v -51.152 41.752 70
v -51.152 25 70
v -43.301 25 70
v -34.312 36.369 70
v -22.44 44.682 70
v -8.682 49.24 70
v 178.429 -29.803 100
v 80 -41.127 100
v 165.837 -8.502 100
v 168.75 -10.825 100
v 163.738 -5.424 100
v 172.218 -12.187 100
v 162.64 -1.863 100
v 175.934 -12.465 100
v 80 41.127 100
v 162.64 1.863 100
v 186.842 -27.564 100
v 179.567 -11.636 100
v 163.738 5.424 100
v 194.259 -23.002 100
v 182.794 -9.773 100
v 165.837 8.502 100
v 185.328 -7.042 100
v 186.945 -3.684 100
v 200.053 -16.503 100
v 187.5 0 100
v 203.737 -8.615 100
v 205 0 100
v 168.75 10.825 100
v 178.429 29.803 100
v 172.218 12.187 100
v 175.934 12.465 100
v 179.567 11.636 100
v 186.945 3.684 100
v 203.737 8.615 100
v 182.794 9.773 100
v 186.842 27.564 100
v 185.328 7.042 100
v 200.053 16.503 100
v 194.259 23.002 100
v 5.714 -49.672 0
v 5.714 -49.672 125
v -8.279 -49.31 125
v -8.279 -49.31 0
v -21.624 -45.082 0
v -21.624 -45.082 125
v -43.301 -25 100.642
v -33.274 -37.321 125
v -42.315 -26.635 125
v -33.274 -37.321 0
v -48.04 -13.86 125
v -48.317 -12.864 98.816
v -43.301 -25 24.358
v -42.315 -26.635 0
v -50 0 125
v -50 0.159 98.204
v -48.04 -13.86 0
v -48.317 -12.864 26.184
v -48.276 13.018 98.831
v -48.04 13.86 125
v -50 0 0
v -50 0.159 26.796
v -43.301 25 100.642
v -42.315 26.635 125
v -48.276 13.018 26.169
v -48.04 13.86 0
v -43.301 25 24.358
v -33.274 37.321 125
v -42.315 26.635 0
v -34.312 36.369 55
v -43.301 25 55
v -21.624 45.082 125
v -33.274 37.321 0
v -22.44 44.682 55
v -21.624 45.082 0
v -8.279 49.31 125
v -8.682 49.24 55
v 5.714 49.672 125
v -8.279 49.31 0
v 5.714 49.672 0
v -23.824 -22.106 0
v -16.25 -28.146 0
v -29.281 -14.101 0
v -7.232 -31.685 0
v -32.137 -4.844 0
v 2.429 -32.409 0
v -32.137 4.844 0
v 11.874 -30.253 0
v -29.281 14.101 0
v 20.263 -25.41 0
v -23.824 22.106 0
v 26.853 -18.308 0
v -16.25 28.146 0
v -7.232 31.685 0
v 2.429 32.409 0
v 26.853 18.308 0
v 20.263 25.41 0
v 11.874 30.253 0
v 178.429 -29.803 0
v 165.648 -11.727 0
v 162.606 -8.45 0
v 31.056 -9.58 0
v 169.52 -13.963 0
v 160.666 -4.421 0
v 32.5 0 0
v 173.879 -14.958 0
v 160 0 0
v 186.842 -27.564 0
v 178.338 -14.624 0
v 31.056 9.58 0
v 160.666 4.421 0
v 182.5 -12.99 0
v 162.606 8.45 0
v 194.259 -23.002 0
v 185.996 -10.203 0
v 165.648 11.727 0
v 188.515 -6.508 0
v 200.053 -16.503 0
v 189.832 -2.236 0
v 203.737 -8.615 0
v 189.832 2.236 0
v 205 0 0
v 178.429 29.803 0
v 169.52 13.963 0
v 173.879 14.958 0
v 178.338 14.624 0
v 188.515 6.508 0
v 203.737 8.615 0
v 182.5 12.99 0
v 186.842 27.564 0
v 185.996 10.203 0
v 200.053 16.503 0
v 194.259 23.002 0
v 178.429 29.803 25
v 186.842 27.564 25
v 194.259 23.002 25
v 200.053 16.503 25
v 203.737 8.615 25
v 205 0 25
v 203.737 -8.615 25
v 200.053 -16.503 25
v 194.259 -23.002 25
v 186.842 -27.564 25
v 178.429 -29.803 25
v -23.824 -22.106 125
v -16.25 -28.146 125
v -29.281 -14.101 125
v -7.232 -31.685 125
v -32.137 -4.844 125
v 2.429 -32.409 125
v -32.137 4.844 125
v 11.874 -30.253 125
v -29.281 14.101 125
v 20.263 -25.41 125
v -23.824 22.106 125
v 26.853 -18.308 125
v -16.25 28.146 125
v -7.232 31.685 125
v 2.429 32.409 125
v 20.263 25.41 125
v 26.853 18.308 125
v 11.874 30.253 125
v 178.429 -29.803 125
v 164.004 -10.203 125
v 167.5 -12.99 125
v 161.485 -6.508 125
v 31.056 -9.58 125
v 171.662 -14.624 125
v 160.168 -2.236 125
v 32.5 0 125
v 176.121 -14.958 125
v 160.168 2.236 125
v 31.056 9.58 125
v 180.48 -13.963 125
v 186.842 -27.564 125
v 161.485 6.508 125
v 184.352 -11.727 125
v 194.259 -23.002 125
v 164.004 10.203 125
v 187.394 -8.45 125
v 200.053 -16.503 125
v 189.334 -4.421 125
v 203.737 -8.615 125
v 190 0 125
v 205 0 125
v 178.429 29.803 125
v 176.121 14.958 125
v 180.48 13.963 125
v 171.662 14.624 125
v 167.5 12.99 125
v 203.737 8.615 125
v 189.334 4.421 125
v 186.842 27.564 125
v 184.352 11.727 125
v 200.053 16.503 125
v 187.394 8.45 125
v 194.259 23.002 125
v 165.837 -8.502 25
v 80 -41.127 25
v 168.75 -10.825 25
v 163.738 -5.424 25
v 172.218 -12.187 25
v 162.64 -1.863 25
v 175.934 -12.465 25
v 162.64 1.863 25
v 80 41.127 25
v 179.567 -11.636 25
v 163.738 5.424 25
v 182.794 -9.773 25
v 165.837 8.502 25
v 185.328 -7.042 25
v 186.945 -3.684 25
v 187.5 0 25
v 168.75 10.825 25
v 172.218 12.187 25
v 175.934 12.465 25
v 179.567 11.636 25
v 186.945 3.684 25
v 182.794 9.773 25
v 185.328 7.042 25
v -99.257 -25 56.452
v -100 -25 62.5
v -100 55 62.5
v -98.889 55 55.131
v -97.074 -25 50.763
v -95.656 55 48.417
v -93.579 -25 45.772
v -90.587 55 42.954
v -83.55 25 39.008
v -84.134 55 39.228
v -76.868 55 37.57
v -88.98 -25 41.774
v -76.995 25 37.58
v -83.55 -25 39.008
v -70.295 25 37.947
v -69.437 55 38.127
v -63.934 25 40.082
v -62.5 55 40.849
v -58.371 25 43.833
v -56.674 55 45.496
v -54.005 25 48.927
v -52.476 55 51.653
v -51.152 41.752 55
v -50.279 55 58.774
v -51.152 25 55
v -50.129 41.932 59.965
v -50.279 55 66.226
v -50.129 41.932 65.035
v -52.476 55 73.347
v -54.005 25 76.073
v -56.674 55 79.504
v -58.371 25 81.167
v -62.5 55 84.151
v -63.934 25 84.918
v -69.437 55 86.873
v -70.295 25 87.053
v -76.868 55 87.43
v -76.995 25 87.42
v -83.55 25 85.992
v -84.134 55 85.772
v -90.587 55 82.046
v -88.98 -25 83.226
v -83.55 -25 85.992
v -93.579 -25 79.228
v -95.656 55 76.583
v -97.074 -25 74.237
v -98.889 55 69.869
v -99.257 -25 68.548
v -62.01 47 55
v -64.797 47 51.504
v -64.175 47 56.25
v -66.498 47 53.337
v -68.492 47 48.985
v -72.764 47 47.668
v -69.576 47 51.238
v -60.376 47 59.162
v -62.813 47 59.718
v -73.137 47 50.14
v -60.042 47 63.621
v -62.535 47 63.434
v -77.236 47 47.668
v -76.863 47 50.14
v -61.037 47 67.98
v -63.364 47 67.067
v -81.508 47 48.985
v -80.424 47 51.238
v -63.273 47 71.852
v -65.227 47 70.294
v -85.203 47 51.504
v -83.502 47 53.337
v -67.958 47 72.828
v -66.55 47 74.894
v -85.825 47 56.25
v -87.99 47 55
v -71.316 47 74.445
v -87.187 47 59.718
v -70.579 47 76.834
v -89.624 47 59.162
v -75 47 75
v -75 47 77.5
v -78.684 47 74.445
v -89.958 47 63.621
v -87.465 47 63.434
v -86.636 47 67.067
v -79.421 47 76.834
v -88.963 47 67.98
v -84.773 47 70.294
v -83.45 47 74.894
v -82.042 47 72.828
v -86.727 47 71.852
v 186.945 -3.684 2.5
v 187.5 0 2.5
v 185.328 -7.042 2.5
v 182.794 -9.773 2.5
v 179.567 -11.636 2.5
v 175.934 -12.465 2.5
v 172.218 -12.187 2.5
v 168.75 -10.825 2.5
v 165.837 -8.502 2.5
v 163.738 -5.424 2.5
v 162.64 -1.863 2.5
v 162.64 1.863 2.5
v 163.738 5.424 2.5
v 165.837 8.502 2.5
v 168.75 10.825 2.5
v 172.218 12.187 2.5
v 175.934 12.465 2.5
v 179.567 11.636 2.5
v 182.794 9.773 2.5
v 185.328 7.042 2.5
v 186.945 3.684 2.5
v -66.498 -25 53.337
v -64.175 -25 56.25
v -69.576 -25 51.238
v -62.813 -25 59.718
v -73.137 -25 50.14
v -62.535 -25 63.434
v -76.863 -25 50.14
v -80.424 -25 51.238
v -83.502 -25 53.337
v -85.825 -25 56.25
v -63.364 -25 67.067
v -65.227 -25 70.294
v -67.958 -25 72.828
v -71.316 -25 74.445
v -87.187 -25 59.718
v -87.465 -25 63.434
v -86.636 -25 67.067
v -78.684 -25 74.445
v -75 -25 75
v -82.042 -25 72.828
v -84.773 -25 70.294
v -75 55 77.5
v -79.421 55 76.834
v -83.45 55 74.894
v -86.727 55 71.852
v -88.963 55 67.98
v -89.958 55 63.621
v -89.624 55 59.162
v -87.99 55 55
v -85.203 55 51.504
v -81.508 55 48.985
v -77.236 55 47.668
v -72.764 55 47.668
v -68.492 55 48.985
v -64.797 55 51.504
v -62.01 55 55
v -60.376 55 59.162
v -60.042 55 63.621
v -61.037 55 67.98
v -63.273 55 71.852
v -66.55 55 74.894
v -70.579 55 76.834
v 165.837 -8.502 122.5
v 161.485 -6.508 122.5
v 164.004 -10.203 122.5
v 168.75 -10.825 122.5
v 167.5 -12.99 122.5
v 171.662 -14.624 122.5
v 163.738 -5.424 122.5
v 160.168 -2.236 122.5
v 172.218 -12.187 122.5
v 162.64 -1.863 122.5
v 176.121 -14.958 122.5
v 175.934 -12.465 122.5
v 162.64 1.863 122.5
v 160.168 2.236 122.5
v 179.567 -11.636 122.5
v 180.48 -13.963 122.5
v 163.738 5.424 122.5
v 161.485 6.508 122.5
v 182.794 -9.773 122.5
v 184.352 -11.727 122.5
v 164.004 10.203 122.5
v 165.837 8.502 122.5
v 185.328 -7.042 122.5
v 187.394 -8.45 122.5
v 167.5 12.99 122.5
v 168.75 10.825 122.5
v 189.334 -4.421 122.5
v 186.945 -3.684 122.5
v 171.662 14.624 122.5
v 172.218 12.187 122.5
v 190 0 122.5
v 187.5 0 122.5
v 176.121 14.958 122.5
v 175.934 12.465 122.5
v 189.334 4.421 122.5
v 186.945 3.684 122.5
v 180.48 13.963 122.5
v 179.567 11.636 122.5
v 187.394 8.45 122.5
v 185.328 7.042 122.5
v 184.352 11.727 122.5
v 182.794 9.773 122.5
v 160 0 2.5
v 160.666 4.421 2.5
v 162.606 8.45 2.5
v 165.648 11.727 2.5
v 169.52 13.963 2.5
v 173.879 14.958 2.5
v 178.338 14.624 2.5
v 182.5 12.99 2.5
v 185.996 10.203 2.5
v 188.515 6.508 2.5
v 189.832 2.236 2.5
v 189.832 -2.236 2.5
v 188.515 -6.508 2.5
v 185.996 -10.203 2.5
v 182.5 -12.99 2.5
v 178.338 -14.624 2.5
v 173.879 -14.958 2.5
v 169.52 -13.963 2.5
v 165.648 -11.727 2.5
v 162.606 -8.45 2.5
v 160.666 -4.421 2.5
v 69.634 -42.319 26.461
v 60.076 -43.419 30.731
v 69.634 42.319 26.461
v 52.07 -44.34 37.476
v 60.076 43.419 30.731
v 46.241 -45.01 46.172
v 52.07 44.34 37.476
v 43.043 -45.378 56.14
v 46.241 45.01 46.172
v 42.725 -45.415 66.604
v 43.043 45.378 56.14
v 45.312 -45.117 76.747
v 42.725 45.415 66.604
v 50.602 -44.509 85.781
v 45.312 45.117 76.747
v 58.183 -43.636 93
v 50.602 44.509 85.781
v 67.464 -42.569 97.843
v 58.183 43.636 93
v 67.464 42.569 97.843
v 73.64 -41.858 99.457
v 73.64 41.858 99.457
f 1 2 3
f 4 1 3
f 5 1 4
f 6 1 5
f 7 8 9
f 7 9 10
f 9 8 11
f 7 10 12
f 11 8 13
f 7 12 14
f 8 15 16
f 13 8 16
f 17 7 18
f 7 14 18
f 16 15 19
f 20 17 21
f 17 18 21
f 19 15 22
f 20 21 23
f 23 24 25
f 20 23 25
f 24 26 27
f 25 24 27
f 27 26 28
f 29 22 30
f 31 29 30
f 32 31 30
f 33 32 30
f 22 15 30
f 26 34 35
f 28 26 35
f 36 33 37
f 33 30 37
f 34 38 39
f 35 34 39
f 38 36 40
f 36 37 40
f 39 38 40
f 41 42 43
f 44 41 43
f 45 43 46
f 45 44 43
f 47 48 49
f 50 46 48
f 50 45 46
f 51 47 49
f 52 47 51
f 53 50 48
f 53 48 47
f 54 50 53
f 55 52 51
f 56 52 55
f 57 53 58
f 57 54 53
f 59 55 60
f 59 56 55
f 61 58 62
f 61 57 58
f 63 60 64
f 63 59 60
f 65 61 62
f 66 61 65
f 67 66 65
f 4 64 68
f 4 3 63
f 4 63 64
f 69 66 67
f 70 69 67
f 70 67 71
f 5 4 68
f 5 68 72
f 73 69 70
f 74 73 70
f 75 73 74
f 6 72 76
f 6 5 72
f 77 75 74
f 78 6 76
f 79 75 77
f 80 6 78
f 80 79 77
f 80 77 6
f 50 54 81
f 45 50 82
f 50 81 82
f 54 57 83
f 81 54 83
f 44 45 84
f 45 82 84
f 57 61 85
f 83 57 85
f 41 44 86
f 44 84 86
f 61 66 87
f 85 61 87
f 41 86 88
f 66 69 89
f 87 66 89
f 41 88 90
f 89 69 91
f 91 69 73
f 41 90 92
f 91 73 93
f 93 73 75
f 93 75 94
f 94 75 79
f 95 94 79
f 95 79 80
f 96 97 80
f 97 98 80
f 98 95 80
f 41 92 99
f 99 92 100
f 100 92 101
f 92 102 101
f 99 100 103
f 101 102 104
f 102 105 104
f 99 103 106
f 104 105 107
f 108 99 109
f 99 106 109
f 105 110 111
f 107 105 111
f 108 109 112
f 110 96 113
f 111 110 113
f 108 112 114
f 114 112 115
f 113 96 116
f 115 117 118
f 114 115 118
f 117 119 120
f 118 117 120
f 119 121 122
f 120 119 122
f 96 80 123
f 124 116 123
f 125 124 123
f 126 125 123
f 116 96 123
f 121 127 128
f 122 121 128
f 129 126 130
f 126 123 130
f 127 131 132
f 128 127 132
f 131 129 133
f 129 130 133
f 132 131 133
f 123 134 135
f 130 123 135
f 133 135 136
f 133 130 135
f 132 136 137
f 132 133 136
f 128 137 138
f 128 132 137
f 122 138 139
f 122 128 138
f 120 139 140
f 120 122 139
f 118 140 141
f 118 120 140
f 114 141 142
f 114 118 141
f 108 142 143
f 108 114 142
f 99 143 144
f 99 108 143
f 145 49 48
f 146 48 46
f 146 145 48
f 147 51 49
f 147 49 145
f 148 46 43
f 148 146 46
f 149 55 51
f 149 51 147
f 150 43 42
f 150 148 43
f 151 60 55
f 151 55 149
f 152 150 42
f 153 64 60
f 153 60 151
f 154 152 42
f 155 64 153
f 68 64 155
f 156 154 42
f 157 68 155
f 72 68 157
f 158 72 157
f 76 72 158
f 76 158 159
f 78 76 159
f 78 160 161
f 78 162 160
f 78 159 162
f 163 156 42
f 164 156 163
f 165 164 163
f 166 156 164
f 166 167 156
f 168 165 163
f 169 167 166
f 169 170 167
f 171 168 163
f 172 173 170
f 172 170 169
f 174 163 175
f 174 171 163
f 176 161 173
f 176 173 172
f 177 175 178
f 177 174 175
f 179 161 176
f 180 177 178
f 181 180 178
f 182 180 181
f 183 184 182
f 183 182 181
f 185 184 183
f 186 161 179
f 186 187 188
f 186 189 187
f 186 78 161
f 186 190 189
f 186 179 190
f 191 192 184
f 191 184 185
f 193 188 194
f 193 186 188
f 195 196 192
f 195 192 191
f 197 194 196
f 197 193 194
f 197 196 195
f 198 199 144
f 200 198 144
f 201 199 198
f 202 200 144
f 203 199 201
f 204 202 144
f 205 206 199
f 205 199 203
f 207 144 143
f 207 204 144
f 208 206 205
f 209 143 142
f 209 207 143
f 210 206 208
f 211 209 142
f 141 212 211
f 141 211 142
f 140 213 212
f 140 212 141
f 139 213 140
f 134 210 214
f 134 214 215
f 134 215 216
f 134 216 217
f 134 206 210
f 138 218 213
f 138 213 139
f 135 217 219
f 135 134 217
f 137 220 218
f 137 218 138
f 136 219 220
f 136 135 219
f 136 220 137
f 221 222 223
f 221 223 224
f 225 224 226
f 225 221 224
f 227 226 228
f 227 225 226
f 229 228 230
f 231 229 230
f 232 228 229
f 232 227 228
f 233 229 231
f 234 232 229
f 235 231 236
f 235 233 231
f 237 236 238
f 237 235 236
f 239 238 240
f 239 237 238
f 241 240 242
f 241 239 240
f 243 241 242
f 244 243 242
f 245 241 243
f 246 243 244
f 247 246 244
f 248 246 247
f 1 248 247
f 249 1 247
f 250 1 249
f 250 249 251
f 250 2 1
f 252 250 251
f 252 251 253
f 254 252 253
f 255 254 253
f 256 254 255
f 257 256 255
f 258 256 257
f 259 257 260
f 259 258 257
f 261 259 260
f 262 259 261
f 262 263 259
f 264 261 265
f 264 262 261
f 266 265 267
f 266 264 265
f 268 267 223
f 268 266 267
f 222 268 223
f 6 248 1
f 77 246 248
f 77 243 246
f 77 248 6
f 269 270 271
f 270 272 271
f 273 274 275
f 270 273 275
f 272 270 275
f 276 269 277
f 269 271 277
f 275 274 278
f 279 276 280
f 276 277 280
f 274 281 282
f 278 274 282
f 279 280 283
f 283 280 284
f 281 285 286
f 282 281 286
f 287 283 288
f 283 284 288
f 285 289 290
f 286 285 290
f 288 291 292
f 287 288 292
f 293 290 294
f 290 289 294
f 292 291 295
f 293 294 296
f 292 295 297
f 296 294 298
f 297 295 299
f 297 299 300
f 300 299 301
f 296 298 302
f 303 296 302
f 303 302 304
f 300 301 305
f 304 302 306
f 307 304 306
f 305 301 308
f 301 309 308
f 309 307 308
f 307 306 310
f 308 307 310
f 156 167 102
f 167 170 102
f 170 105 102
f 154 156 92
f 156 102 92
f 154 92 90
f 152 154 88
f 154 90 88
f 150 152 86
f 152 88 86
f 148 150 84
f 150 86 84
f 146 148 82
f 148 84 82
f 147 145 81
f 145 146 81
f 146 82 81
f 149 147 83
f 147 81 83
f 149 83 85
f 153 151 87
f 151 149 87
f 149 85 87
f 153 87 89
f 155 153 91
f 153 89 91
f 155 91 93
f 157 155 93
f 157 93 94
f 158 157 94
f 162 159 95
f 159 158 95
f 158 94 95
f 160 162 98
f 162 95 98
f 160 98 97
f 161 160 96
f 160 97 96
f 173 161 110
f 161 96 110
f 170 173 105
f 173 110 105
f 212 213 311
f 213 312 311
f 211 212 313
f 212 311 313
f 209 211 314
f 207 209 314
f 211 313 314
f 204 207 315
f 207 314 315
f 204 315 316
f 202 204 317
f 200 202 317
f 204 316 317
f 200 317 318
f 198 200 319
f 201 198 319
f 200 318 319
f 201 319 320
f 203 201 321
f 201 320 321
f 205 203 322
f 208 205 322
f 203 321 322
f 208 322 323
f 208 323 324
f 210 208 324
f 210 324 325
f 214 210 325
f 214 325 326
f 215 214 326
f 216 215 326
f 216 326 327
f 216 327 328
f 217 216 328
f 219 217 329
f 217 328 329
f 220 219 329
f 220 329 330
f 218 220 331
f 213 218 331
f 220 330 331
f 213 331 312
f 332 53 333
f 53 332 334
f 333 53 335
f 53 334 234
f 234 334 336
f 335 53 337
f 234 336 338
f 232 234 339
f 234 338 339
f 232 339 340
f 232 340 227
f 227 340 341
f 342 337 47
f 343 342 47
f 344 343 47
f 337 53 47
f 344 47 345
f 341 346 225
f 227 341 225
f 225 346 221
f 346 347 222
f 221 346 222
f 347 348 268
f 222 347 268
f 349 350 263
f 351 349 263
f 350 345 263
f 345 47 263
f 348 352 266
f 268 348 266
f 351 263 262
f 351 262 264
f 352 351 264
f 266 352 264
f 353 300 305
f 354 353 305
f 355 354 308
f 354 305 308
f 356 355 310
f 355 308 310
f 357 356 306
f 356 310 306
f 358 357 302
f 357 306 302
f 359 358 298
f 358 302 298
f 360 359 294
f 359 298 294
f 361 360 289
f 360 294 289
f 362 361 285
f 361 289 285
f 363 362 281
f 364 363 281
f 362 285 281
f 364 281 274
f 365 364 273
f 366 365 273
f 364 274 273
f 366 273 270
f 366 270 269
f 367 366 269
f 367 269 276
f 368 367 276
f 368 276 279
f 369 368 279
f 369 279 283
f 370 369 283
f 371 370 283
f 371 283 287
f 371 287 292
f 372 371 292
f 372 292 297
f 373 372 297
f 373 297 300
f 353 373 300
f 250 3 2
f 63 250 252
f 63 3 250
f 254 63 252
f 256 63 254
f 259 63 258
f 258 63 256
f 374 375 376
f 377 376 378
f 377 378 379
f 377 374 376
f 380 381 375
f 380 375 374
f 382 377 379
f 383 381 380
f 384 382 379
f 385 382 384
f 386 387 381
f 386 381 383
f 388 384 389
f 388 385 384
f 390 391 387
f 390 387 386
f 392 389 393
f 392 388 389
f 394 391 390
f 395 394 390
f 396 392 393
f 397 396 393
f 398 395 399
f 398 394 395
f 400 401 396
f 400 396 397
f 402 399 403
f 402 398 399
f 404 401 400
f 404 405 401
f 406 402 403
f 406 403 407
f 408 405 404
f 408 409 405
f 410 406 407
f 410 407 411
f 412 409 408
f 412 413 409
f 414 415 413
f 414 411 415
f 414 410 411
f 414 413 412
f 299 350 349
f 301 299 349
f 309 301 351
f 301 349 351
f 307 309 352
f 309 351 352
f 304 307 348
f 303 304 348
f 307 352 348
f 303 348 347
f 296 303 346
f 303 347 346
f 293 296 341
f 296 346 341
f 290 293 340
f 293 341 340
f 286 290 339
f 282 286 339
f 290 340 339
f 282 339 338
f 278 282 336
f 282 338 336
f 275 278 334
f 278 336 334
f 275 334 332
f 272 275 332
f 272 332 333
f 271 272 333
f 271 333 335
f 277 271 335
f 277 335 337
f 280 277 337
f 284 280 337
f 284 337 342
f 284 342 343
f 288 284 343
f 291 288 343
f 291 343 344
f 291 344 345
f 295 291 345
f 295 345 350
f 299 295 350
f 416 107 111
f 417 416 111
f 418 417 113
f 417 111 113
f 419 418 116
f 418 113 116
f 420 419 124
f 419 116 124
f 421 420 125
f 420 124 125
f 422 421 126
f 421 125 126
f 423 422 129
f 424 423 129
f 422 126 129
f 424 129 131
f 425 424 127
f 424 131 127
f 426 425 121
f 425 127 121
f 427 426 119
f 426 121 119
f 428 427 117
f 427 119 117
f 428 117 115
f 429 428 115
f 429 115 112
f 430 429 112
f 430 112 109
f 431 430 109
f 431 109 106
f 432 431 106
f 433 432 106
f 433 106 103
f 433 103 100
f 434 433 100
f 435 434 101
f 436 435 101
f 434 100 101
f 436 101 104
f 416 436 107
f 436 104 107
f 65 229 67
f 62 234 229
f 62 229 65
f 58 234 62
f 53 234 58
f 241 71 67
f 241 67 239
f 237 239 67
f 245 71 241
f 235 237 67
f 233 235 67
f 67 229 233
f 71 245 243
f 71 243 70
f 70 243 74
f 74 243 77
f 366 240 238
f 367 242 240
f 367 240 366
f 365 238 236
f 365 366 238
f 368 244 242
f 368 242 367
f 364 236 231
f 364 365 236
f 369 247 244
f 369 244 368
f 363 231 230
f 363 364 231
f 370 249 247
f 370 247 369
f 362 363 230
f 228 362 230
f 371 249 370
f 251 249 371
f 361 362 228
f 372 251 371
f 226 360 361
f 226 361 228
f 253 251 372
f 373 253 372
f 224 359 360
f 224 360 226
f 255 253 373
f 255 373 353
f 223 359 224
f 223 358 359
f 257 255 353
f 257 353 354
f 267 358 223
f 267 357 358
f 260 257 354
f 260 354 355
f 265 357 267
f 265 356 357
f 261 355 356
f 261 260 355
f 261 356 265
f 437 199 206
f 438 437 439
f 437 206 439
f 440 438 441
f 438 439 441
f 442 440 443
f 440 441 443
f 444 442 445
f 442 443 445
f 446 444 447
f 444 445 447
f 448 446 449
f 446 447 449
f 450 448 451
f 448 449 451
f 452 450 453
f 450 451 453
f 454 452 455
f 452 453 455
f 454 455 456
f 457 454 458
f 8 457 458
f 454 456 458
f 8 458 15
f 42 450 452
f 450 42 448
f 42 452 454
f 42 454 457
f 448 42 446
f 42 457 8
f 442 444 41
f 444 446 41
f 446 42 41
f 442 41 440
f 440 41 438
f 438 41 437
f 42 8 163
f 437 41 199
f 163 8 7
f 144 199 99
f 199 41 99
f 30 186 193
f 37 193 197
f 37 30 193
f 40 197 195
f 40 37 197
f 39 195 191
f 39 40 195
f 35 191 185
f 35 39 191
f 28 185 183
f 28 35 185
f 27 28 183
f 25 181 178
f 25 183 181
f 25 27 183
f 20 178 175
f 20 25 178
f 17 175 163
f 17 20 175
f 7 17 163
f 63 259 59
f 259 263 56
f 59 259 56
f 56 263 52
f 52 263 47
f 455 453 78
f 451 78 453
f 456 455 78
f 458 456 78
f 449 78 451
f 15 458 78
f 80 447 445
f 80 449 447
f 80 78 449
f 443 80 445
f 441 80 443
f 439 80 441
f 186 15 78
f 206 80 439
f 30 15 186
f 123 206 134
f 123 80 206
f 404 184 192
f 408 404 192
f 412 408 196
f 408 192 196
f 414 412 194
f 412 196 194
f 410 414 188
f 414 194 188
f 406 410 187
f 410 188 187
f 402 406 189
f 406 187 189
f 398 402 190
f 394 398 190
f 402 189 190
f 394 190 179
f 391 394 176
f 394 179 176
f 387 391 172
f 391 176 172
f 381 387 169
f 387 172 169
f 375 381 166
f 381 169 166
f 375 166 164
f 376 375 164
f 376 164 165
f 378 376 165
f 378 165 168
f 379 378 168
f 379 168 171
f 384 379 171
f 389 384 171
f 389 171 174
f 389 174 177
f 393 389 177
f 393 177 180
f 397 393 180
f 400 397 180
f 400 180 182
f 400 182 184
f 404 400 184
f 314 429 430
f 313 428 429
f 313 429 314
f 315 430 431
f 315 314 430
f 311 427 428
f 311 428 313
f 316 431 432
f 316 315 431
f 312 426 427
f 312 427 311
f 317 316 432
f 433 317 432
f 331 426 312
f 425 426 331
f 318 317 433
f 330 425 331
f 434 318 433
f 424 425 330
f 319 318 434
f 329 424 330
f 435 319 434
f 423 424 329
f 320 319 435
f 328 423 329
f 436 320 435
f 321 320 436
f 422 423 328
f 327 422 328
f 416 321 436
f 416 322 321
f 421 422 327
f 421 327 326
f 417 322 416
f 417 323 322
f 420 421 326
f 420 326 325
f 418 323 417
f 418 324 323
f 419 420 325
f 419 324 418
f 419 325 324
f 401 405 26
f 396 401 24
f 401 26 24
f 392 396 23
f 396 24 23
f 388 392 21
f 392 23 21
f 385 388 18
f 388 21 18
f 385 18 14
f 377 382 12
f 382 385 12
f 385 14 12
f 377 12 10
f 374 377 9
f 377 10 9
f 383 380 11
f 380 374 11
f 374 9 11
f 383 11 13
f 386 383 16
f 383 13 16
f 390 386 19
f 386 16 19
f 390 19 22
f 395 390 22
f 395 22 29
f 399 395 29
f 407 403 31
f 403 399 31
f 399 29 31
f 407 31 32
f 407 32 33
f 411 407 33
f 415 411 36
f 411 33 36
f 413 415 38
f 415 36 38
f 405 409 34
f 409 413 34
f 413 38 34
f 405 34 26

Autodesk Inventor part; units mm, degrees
ref_plane "YZ Plane" through (0, 0, 0) normal (1, 0, 0) x (0, 1, 0)
sketch "Esboço1" plane through (0, 0, 0) normal (0, 0, 1) x (1, 0, 0)
  arc A0 (5.7143, 49.6724) -> (5.7143, -49.6724) centre (0, 0) ccw
  arc A1 (178.4286, -29.8034) -> (178.4286, 29.8034) centre (175, 0) ccw
  line L0 (5.7143, 49.6724) -> (178.4286, 29.8034)
  line L1 (0, 0) -> (175, 0) construction
  line L2 (5.7143, -49.6724) -> (178.4286, -29.8034)
  circle A2 centre (0, 0) radius 32.5
  circle A3 centre (175, 0) radius 12.5
  point P0 (-54.0476, 56.5474)
  point P1 (215.9085, 25.4918)
  point P2 (-54.0476, -56.5474)
  point P3 (215.9085, -25.4918)
  dimension "d0" = 100
  dimension "d1" = 60
  dimension "d2" = 175
  dimension "d3" = 65
  dimension "d4" = 25
extrude "Extrusão1" add sketch "Esboço1" along normal blind 125
ref_plane "Plano de trabalho1" through (0, -25, 0) normal (0, 1, 0) x (-1, 0, 0)
sketch "Esboço2" plane through (0, -25, 0) normal (0, 1, 0) x (-1, 0, 0)
  line L0 (0, 0) -> (0, 125) construction
  line L1 (50, 125) -> (-5.7143, 125) construction
  line L2 (0, 62.5) -> (109.1848, 62.5) construction
  circle A0 centre (75, 62.5) radius 25
  dimension "d8" = 50
  dimension "d9" = 75
extrude "Extrusão2" add sketch "Esboço2" along normal blind 80
sketch "Esboço3" plane through (0, -25, 0) normal (0, 1, 0) x (-1, 0, 0)
  circle A0 centre (75, 62.5) radius 25 projected
  arc A1 (83.5505, 85.9923) -> (83.5505, 39.0077) centre (75, 62.5) ccw
  line L0 (83.5505, 39.0077) -> (39.6496, 23.0291)
  line L1 (50, 125) -> (-5.7143, 125) projected
  line L2 (75, 62.5) -> (-32.0182, 62.5) construction
  line L3 (83.5505, 85.9923) -> (39.6496, 101.9709)
  line L4 (39.6496, 23.0291) -> (39.6496, 101.9709)
  point P0 (0, 0)
  point P1 (94.387, 42.9518)
  point P2 (9.9213, 12.2089)
  point P3 (94.387, 82.0482)
  point P4 (9.9213, 112.7911)
  point P5 (83.5505, 39.0077)
  dimension "d12" = 20
extrude "Extrusão3" add sketch "Esboço3" along normal blind 50 contours A0 L0 L4 L3
ref_plane "Plano de trabalho2" through (0, 0, 62.5) normal (0, 0, 1) x (1, 0, 0)
sketch "Esboço4" plane through (0, 0, 62.5) normal (0, 0, 1) x (1, 0, 0)
  line L0 (-50, 55) -> (-100, 55) projected
  line L1 (-75, 37.5468) -> (-75, 0)
  arc A0 (-8.6824, 49.2404) -> (-50, 0) centre (0, 0) ccw
  line L2 (-75, 0) -> (-50, 0)
  line L3 (-75, 37.5468) -> (-8.6824, 49.2404)
  dimension "d16" = 100
  dimension "d17" = 80
extrude "Extrusão4" add sketch "Esboço4" along normal mid plane 15
sketch "Esboço5" plane through (0, 0, 0) normal (0, 1, 0) x (-1, 0, 0)
  line L0 (0, 0) -> (0, 125) construction
  line L1 (0, 62.5) -> (-205, 62.5) construction
  line L2 (-205, 0) -> (-205, 125) construction
  arc A0 (-80, 25) -> (-80, 100) centre (-80, 62.5) ccw
  line L3 (-80, 25) -> (-214.9719, 25)
  line L4 (-80, 100) -> (-214.9719, 100)
  line L5 (-214.9719, 100) -> (-214.9719, 25)
  dimension "d20" = 75
  dimension "d21" = 80
extrude "Extrusão5" cut sketch "Esboço5" against normal through all both and the other way through all
sketch "Esboço6" plane through (-75, 55, 62.5) normal (0, 1, 0) x (1, 0, 0)
  point P0 (75, 62.5)
  point P1 (0, 0)
  point P2 (0, 0)
hole "Furo1" at (-75, 55, 62.5) at (-75, 55, 62.5) direction (0, -1, 0) diameter 25 end through all counterbore diameter 30 counterbore depth 8
sketch "Esboço7" plane through (0, 0, 125) normal (0, 0, 1) x (1, 0, 0)
  circle A0 centre (175, 0) radius 12.5 projected
  circle A1 centre (175, 0) radius 15
  point P0 (0, 0)
  dimension "d31" = 30
extrude "Extrusão6" cut sketch "Esboço7" against normal blind 2.5
sketch "Esboço8" plane through (0, 0, 0) normal (0, 0, -1) x (-1, 0, 0)
  circle A0 centre (-175, 0) radius 12.5 projected
  circle A1 centre (-175, 0) radius 15
  point P0 (0, 0)
  dimension "d34" = 30
extrude "Extrusão7" cut sketch "Esboço8" against normal blind 2.5
properties part number "Rubia_ASR3"
